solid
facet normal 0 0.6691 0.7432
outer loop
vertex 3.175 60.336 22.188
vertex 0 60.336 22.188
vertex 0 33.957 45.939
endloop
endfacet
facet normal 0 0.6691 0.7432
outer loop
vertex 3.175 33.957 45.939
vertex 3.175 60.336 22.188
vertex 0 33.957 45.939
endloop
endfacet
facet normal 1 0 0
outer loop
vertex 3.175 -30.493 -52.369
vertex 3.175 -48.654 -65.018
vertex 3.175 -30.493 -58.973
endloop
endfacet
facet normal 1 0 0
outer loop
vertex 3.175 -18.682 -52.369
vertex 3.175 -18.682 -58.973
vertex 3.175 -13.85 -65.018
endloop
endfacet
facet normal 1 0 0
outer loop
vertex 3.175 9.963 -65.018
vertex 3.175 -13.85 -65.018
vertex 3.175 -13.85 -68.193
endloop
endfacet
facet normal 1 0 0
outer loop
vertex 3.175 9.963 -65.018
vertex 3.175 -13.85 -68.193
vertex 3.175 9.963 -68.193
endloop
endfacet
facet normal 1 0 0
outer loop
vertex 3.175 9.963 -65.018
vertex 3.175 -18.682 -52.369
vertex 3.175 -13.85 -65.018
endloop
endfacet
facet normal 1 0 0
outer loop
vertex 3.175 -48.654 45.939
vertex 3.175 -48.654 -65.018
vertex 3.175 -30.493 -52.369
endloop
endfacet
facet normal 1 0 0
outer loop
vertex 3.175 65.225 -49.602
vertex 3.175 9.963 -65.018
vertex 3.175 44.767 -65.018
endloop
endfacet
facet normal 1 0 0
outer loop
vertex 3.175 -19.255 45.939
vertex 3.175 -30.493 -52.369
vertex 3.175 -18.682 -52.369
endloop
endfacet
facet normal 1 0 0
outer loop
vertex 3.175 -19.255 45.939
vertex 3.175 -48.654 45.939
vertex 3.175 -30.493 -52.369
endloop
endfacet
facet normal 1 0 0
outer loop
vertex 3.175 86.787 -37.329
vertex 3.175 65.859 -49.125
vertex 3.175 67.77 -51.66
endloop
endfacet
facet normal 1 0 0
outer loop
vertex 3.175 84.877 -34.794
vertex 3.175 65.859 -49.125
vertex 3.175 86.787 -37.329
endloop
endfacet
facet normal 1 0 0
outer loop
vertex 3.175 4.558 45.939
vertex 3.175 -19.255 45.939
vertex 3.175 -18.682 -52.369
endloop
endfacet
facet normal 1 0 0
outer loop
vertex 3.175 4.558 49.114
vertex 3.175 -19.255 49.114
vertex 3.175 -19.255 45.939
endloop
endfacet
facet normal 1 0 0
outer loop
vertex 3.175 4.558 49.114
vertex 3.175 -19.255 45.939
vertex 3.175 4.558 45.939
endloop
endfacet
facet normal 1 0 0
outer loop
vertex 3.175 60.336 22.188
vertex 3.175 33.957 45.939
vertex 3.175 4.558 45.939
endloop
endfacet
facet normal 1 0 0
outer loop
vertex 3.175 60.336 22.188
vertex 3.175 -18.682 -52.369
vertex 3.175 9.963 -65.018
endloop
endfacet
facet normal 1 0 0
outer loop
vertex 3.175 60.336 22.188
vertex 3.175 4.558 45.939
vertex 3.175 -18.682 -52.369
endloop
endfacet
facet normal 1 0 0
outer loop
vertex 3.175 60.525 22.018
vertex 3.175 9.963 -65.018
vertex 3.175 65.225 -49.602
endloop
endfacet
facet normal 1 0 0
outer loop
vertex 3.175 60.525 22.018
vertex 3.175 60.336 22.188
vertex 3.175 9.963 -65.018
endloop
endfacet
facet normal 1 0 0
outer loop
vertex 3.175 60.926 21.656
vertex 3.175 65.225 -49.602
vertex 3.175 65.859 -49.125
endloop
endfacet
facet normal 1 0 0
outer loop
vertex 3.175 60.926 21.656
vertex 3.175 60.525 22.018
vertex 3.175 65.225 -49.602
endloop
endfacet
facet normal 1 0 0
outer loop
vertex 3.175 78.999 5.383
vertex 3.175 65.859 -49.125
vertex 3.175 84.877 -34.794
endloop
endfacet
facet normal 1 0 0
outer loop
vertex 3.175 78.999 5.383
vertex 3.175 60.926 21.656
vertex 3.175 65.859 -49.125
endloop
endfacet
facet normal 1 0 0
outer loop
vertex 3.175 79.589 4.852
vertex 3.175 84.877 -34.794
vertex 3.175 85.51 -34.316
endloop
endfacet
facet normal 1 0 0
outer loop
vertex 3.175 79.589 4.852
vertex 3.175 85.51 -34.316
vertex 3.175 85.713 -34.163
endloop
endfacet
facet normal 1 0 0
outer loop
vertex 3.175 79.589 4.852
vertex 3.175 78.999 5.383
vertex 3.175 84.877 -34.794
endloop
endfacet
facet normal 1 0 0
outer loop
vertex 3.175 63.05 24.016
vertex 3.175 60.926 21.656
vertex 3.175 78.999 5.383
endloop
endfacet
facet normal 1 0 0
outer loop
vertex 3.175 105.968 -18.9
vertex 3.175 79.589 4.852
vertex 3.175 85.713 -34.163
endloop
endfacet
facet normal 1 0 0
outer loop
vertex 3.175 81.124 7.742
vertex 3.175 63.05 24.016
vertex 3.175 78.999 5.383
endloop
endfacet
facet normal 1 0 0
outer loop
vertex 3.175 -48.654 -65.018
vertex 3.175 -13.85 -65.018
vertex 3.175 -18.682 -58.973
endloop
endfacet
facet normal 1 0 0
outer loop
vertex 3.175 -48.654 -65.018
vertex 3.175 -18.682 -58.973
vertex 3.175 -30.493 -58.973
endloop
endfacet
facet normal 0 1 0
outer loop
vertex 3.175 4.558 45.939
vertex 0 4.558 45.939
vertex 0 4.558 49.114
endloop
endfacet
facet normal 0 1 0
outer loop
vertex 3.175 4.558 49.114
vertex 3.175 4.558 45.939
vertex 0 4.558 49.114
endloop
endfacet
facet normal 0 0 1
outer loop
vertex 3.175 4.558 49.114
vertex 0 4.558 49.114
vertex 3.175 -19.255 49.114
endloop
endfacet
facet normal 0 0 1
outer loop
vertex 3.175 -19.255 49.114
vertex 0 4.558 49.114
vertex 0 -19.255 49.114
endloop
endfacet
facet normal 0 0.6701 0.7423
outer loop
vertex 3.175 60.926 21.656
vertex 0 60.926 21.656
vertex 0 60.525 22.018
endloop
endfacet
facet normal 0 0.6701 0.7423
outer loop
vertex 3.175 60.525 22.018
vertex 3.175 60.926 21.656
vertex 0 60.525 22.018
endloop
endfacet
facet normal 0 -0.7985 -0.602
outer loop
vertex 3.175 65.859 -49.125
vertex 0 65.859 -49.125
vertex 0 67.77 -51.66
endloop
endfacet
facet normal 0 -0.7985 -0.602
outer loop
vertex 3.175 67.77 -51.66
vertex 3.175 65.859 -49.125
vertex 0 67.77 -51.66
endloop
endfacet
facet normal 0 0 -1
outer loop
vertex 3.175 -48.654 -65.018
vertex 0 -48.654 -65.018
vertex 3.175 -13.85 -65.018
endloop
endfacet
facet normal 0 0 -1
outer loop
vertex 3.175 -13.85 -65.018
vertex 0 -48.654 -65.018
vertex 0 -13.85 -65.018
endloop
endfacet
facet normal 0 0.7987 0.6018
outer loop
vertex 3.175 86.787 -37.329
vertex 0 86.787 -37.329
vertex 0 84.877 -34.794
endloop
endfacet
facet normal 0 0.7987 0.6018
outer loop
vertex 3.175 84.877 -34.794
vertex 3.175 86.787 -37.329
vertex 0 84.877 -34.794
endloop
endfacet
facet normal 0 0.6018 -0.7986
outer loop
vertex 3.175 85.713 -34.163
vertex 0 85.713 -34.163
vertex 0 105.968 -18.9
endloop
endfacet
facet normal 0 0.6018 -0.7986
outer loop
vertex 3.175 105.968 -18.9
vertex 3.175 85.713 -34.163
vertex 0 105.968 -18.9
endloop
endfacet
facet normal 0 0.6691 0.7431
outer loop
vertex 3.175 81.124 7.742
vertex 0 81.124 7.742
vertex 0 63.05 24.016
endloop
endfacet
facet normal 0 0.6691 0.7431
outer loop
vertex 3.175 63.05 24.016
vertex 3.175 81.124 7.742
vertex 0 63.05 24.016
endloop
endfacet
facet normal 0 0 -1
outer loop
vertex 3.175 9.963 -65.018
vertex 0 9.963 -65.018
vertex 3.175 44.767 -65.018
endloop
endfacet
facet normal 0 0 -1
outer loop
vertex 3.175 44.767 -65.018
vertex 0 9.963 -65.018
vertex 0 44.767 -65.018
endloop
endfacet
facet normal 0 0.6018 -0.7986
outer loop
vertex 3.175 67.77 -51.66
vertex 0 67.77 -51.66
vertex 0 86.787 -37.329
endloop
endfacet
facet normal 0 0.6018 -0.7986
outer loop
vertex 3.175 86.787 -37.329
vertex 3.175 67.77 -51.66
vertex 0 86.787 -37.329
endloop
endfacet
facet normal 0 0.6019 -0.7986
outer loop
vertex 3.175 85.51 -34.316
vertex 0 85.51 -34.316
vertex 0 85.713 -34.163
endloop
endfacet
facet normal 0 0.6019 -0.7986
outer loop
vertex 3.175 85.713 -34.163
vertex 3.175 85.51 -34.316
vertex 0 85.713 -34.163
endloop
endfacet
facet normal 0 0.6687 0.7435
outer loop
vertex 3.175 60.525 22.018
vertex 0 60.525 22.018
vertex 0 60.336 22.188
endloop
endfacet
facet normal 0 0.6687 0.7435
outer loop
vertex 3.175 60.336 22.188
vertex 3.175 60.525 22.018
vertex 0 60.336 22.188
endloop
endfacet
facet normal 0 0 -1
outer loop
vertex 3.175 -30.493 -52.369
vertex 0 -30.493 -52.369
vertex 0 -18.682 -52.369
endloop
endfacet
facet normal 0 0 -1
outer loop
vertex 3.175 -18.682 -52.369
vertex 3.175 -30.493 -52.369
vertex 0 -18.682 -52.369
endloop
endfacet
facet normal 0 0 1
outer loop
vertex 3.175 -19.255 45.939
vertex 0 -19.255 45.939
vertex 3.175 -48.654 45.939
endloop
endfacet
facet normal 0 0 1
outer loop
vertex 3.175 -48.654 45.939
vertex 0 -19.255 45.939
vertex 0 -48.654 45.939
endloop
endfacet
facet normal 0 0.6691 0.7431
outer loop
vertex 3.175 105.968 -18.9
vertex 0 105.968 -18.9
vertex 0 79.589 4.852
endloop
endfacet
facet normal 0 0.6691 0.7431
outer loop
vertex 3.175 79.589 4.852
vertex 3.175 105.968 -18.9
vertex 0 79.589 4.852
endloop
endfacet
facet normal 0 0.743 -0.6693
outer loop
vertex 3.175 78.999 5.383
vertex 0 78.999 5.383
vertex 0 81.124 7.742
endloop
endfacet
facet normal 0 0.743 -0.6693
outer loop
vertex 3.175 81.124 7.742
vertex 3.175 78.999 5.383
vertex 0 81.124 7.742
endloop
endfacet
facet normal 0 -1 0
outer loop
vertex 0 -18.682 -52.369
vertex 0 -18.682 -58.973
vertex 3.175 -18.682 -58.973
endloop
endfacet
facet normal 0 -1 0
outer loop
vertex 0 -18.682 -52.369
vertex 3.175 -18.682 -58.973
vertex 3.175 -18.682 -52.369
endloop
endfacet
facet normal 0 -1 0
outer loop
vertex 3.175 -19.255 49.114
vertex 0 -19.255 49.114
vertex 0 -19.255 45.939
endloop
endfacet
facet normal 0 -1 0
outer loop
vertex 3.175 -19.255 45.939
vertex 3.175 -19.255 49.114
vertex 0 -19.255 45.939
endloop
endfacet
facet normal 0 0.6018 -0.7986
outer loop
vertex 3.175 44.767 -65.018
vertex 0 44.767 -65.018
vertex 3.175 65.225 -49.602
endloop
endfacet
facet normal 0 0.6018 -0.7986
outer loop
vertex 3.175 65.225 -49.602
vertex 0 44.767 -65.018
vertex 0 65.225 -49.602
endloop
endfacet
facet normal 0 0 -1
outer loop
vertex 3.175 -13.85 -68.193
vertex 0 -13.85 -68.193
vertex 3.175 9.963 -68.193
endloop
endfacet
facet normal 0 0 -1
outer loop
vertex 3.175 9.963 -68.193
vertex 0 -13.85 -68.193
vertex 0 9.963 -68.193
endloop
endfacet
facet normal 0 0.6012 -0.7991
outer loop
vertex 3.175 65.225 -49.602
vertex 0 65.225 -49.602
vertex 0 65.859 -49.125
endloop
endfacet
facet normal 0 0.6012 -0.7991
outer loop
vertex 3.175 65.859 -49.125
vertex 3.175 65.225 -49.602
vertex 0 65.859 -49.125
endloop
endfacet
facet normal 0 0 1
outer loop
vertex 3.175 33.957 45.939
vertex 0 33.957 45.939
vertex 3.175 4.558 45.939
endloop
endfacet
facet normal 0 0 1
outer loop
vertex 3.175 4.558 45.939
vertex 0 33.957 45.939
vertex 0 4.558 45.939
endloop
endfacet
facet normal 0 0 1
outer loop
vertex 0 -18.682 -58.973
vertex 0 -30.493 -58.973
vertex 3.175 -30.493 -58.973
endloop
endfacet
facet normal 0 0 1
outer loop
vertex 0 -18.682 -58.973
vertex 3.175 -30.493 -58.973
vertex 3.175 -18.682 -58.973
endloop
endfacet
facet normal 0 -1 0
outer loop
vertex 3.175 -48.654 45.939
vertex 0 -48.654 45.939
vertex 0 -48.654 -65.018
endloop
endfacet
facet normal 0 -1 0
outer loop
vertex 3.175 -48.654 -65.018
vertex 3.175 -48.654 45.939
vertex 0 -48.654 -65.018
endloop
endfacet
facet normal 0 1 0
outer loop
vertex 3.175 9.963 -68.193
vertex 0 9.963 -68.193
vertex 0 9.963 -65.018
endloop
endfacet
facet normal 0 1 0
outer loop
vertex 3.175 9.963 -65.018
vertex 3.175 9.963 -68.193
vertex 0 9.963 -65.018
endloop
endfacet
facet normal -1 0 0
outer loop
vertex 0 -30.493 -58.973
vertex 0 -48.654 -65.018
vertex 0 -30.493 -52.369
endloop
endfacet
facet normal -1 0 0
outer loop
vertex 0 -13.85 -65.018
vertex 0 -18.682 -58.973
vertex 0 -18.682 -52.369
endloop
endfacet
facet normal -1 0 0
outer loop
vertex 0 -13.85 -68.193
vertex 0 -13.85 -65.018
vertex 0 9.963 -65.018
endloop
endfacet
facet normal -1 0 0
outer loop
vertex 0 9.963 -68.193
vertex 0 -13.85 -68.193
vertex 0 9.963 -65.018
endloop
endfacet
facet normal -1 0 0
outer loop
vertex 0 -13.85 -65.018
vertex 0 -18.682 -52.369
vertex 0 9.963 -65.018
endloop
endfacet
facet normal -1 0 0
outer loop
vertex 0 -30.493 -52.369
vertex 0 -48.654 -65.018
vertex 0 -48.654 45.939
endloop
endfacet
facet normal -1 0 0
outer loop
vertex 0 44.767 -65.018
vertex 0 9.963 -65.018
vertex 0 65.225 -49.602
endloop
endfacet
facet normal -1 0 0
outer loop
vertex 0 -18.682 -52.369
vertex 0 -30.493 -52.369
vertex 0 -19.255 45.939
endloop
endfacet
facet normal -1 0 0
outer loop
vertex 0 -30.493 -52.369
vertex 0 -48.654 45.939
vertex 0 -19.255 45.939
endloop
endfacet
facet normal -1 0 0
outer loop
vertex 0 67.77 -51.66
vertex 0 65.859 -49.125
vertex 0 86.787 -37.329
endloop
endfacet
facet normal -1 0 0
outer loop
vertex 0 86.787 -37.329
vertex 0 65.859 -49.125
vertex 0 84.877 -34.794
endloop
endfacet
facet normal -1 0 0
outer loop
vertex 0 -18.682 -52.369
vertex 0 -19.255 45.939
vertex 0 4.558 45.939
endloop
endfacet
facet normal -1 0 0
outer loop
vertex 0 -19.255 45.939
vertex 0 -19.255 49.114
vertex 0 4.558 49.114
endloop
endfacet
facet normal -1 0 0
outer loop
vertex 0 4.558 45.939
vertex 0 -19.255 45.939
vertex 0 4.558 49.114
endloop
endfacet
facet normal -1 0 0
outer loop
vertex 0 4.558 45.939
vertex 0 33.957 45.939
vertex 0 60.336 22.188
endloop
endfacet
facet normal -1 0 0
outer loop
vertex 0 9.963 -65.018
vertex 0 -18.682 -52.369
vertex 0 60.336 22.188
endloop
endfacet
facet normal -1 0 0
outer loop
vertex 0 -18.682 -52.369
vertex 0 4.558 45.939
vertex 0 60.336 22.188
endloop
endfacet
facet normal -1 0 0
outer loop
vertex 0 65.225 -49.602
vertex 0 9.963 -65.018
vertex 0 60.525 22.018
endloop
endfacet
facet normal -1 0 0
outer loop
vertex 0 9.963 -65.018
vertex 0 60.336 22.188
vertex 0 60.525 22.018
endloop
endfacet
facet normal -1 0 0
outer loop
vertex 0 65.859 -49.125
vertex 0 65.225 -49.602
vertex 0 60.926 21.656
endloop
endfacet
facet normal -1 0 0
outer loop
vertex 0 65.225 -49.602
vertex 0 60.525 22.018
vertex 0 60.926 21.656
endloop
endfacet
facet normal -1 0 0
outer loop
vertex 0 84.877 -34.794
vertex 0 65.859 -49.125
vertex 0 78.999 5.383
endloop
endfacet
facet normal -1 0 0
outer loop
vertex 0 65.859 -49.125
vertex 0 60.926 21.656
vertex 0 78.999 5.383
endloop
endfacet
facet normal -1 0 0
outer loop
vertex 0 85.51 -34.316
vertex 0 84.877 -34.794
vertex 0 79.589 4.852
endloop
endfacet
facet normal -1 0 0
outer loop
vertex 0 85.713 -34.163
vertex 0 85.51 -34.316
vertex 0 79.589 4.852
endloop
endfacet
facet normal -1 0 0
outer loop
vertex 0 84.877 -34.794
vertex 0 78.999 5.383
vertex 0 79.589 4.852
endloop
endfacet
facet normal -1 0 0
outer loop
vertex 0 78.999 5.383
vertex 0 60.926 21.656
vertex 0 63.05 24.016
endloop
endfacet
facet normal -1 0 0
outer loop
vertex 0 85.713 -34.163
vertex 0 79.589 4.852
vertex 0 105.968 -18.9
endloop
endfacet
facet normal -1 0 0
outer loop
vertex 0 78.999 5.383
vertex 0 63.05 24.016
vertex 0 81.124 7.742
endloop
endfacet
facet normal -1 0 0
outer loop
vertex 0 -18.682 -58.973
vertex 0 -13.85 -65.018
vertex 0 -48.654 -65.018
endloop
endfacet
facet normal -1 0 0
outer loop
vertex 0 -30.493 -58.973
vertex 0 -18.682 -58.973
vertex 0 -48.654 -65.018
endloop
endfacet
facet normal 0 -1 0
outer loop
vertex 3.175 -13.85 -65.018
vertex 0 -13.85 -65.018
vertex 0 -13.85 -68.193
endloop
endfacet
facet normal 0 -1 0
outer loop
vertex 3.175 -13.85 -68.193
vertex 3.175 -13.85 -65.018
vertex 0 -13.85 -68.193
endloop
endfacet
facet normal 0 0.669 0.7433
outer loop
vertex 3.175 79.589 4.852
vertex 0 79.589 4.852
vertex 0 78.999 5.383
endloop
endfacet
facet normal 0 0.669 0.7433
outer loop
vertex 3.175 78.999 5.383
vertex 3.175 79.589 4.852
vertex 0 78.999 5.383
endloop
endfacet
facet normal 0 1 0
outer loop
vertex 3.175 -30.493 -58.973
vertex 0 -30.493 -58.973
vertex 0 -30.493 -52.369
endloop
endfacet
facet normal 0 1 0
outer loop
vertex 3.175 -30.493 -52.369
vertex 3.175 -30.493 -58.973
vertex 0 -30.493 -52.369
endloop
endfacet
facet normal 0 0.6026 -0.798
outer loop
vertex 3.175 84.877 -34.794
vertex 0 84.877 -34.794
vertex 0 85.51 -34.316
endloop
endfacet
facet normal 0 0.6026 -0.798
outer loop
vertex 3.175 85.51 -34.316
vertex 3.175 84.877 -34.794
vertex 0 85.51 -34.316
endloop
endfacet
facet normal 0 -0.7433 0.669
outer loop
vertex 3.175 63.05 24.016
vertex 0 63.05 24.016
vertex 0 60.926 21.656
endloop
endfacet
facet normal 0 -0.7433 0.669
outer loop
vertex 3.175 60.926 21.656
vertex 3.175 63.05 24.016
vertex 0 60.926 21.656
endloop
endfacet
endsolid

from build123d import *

# Parameters (mm, degrees)
F0_W     = 11.811
F0_H     = 6.604
F1_DEPTH = 3.175


with BuildPart() as f1:
    # F0 (on Right) → F1 (new body)
    with BuildSketch(Plane.YZ):
        Polygon((60.335764, 22.187536), (33.956723, 45.939331), (5.605423, 45.939331), (5.351423, 45.939331), (4.557673, 45.939331), (4.557673, 49.114331), (-7.348577, 49.114331), (-19.254827, 49.114331), (-19.254827, 45.939331), (-20.048577, 45.939331), (-48.653877, 45.939331), (-48.653877, 3.160534), (-48.653877, -22.239466), (-48.653877, -65.018263), (-14.643277, -65.018263), (-13.849527, -65.018263), (-13.849527, -68.193263), (-1.943277, -68.193263), (9.962973, -68.193263), (9.962973, -65.018263), (10.756723, -65.018263), (11.010723, -65.018263), (44.767323, -65.018263), (65.225091, -49.602229), (65.859237, -49.124843), (67.76977, -51.660206), (77.278524, -44.494846), (86.787278, -37.329486), (84.876745, -34.794122), (85.510433, -34.316128), (85.713286, -34.163267), (105.9682, -18.900094), (79.58916, 4.8517), (78.999288, 5.382823), (81.123778, 7.742308), (72.086951, 15.879103), (63.050124, 24.015898), (60.925635, 21.656414), (60.524522, 22.017577), align=None)
        with Locations((-24.587377, -55.671063)):
            Rectangle(F0_W, F0_H, mode=Mode.SUBTRACT)
    extrude(amount=F1_DEPTH)


solid = f1.part
